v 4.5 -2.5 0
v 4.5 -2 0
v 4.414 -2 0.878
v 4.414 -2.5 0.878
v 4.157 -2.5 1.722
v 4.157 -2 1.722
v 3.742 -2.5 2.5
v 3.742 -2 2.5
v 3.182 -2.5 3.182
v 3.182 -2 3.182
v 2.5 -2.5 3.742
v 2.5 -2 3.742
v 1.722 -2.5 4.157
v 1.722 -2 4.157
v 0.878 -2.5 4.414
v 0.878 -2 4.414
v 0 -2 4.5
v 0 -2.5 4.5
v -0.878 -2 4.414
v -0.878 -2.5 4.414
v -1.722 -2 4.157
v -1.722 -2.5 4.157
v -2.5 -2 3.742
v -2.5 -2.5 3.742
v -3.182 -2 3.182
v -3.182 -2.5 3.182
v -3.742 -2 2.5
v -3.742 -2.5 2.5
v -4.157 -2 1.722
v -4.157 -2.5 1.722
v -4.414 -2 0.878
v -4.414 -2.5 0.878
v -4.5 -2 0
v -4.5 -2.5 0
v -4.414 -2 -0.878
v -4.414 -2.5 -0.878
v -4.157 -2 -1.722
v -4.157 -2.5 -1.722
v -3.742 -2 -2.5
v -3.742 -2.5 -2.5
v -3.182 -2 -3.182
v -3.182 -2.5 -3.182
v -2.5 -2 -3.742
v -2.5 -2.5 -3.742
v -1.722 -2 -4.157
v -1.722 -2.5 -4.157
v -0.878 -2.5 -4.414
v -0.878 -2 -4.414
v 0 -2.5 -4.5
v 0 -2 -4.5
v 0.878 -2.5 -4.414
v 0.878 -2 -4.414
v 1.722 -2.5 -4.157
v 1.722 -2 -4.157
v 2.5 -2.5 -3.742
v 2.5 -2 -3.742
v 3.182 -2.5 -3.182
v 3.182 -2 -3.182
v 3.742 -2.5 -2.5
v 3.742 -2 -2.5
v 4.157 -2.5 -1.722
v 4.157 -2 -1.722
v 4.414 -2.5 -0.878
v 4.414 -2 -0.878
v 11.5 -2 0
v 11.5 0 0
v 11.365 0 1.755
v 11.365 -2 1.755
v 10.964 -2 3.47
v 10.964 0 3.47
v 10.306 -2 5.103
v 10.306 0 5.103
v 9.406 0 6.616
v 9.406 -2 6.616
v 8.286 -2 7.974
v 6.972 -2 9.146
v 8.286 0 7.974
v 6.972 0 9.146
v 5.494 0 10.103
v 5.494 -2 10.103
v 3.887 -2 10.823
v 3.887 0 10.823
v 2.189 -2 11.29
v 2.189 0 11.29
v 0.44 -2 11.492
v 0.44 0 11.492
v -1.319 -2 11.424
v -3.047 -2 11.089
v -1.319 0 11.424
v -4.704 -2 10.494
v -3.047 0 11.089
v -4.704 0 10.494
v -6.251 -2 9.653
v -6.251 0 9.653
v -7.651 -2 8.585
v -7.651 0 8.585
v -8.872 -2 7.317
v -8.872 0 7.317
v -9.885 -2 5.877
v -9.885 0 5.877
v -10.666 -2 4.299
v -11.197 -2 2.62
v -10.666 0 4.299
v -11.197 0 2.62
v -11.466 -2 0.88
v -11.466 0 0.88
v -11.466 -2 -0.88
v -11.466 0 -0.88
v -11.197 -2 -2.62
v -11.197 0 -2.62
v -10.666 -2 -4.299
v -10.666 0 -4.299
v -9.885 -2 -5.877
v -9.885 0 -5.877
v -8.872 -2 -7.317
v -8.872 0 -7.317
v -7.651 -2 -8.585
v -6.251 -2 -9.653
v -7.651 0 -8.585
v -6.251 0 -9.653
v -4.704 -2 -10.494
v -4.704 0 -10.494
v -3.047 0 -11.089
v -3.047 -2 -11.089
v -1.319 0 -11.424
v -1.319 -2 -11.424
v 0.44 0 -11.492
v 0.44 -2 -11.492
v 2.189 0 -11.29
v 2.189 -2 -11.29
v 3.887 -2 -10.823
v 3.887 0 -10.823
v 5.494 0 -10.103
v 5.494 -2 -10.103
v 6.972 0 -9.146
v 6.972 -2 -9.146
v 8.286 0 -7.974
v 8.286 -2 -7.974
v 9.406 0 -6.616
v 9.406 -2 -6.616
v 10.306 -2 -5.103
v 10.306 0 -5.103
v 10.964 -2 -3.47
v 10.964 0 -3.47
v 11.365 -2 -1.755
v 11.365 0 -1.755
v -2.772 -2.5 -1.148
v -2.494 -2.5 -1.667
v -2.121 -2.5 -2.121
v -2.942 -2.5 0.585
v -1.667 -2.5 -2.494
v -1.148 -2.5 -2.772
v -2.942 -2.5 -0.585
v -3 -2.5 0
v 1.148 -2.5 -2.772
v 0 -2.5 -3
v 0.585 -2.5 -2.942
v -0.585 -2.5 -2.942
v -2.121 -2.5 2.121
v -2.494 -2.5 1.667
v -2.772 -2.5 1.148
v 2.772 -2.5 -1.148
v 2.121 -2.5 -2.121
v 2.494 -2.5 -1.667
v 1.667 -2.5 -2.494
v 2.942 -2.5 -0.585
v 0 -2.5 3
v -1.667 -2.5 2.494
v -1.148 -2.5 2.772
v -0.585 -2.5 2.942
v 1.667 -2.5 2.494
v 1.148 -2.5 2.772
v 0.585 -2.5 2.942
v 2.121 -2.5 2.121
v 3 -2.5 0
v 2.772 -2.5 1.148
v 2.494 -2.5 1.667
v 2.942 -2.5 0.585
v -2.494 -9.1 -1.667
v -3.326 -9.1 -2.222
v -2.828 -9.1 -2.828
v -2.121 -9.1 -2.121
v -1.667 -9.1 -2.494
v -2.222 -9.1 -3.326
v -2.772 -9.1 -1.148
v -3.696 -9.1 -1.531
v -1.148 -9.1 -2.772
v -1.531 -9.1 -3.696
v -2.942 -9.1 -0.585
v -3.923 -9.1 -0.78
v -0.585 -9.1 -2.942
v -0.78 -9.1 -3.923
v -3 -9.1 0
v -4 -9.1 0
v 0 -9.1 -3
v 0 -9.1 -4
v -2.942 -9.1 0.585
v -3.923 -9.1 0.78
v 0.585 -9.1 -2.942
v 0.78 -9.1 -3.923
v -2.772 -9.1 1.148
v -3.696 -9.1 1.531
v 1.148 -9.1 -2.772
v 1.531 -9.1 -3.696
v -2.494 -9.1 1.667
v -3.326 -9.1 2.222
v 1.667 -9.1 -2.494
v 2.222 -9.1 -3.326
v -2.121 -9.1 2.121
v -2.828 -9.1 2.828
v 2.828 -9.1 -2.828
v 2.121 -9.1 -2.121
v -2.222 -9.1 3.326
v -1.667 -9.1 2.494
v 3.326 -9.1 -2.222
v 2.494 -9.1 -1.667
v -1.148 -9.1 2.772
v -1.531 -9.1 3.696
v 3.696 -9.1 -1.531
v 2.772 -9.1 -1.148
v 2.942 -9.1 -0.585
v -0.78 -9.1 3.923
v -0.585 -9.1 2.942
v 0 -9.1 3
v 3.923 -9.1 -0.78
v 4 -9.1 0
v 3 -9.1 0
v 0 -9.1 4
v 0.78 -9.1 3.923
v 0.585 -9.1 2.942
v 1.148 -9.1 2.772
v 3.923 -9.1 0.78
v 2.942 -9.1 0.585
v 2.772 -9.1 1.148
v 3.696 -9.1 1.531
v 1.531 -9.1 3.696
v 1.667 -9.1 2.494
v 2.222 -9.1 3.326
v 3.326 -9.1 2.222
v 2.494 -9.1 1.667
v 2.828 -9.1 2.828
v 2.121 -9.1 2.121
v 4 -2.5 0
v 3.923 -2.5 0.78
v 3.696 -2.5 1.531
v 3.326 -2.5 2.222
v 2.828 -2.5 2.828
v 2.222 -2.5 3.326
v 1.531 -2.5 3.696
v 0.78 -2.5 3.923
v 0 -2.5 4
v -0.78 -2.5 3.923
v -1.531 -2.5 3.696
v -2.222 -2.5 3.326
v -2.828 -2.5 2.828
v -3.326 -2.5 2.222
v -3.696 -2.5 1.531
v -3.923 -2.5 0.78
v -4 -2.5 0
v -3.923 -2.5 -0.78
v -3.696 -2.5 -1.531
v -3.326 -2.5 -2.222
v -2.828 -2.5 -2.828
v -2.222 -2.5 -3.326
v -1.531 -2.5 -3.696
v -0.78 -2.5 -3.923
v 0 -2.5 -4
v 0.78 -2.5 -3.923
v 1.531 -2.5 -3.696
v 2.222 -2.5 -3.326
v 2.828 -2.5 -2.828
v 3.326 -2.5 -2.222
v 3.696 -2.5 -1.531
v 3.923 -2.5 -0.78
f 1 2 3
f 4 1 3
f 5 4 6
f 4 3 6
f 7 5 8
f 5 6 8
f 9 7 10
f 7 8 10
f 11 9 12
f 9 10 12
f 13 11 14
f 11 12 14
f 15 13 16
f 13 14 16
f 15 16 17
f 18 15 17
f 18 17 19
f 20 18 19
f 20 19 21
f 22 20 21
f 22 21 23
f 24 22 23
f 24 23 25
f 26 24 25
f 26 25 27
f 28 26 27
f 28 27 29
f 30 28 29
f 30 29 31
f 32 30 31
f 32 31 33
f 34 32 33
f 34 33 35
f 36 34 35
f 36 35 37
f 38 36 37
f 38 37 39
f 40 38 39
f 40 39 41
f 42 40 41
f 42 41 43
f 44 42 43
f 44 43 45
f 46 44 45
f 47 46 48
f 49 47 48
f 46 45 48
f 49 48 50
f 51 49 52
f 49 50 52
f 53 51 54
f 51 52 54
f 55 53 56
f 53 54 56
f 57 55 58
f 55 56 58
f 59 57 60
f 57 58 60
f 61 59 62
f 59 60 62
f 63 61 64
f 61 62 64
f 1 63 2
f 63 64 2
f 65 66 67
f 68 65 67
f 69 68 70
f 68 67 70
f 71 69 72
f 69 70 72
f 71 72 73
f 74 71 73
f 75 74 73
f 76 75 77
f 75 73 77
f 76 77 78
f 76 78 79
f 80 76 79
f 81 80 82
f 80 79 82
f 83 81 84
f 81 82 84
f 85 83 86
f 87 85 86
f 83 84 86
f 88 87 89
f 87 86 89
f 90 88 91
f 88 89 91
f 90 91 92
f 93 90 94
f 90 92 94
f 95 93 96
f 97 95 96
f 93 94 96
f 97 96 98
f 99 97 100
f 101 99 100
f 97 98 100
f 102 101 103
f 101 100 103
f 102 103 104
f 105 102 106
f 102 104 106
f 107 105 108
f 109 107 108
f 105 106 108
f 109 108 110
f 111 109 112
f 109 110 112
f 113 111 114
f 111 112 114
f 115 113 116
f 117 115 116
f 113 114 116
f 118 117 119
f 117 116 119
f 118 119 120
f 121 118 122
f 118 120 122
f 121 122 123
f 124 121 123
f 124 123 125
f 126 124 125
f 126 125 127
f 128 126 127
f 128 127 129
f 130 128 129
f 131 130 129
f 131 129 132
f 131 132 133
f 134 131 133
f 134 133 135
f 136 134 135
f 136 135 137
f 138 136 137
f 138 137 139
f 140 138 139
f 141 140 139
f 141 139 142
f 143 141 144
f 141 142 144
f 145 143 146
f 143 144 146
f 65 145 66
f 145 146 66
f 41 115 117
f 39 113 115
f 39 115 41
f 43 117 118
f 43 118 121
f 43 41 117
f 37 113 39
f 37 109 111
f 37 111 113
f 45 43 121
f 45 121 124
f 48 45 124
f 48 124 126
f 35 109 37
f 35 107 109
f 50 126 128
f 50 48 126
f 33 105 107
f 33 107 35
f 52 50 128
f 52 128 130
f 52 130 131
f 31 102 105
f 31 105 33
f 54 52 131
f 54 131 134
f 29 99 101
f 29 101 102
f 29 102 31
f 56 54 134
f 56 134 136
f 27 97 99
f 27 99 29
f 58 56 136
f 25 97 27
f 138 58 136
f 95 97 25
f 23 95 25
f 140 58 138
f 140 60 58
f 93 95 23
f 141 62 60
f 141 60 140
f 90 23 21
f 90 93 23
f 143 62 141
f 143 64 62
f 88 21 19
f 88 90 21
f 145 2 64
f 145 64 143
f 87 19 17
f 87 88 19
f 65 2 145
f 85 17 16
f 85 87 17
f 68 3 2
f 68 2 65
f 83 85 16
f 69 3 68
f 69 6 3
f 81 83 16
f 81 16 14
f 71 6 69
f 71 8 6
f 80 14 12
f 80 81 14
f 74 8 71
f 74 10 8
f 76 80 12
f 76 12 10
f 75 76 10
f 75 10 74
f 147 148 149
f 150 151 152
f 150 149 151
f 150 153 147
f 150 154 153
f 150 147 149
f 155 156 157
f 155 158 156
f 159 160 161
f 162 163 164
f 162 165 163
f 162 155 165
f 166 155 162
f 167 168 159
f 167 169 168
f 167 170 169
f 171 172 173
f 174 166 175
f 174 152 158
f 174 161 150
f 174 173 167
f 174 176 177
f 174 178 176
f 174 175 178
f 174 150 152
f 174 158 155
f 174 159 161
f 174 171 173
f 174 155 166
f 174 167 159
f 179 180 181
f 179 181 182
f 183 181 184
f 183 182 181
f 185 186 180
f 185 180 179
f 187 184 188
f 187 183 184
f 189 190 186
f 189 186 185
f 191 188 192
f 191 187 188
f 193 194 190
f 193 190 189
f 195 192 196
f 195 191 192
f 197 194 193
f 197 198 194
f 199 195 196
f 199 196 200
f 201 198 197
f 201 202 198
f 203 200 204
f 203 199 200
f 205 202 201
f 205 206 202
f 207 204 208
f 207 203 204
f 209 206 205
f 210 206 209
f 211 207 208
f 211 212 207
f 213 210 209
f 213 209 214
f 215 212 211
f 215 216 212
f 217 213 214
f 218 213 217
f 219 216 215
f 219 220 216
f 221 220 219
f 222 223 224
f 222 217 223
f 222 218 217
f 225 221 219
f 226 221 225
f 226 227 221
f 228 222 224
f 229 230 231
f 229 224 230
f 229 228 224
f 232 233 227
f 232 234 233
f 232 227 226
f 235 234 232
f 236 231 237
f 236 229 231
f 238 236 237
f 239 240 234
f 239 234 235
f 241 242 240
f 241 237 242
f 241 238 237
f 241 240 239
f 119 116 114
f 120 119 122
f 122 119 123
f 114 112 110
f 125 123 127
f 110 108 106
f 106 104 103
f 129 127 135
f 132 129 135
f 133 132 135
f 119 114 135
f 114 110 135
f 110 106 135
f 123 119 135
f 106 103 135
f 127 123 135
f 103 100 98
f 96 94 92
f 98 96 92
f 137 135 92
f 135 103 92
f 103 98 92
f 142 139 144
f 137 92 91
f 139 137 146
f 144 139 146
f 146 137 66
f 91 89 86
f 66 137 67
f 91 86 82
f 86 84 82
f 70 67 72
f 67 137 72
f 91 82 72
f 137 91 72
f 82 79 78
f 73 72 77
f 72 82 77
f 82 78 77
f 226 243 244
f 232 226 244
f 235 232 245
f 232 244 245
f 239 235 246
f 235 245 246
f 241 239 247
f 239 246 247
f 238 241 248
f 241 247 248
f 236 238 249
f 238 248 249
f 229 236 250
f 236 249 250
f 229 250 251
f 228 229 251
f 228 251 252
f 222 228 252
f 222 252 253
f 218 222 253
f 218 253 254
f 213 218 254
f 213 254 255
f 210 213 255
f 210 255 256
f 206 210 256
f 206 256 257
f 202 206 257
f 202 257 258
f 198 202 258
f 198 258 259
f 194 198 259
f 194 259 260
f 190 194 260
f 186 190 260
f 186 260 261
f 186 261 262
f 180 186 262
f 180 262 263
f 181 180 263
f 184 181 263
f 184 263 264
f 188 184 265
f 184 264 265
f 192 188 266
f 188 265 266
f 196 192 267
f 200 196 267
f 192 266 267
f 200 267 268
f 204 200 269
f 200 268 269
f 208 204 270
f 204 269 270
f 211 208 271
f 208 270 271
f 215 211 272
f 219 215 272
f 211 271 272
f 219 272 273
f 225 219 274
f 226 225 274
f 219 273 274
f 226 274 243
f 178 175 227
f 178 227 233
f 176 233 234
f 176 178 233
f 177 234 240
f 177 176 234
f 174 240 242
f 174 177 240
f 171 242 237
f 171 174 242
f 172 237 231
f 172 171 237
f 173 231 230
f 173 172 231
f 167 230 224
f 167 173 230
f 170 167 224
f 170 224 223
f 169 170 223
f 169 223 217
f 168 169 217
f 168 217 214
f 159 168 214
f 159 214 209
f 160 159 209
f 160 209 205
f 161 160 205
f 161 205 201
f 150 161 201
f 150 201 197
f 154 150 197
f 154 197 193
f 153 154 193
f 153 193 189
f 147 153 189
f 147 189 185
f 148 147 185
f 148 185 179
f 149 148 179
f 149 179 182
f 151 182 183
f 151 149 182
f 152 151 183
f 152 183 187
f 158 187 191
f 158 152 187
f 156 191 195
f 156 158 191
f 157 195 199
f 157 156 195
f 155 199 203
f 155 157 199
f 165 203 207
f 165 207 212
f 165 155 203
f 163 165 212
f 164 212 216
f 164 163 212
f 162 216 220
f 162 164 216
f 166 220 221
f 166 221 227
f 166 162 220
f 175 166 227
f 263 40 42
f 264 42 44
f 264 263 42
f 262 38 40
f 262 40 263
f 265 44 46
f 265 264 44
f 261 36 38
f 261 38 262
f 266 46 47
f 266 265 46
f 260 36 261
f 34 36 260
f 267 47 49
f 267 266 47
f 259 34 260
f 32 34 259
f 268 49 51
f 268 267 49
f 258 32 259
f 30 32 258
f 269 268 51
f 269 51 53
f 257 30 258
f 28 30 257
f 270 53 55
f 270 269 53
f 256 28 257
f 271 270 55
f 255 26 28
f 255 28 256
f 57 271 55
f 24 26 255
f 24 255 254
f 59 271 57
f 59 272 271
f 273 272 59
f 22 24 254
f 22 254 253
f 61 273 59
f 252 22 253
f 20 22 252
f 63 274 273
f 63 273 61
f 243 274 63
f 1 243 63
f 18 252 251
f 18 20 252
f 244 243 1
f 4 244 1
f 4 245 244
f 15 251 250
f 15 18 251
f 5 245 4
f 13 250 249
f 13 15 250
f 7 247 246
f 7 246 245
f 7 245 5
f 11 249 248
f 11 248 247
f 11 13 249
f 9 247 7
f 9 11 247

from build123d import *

# Parameters (mm, degrees)
F0_R     = 4
F0_R_2   = 3
F2_DEPTH = 9.1
F1_R     = 11.5
F3_DEPTH = 2
F4_R     = 4.5
F5_DEPTH = 2.5


with BuildPart() as f2:
    # F0 (on Front) → F2 (new body)
    with BuildSketch(Plane.XZ):
        Circle(F0_R)
        Circle(F0_R_2, mode=Mode.SUBTRACT)
    extrude(amount=F2_DEPTH)

    # F1 (on Front) → F3 (join)
    with BuildSketch(Plane.XZ):
        Circle(F1_R)
    extrude(amount=F3_DEPTH)

    # F4 (on Front) → F5 (join)
    with BuildSketch(Plane.XZ):
        Circle(F4_R)
    extrude(amount=F5_DEPTH)


solid = f2.part
